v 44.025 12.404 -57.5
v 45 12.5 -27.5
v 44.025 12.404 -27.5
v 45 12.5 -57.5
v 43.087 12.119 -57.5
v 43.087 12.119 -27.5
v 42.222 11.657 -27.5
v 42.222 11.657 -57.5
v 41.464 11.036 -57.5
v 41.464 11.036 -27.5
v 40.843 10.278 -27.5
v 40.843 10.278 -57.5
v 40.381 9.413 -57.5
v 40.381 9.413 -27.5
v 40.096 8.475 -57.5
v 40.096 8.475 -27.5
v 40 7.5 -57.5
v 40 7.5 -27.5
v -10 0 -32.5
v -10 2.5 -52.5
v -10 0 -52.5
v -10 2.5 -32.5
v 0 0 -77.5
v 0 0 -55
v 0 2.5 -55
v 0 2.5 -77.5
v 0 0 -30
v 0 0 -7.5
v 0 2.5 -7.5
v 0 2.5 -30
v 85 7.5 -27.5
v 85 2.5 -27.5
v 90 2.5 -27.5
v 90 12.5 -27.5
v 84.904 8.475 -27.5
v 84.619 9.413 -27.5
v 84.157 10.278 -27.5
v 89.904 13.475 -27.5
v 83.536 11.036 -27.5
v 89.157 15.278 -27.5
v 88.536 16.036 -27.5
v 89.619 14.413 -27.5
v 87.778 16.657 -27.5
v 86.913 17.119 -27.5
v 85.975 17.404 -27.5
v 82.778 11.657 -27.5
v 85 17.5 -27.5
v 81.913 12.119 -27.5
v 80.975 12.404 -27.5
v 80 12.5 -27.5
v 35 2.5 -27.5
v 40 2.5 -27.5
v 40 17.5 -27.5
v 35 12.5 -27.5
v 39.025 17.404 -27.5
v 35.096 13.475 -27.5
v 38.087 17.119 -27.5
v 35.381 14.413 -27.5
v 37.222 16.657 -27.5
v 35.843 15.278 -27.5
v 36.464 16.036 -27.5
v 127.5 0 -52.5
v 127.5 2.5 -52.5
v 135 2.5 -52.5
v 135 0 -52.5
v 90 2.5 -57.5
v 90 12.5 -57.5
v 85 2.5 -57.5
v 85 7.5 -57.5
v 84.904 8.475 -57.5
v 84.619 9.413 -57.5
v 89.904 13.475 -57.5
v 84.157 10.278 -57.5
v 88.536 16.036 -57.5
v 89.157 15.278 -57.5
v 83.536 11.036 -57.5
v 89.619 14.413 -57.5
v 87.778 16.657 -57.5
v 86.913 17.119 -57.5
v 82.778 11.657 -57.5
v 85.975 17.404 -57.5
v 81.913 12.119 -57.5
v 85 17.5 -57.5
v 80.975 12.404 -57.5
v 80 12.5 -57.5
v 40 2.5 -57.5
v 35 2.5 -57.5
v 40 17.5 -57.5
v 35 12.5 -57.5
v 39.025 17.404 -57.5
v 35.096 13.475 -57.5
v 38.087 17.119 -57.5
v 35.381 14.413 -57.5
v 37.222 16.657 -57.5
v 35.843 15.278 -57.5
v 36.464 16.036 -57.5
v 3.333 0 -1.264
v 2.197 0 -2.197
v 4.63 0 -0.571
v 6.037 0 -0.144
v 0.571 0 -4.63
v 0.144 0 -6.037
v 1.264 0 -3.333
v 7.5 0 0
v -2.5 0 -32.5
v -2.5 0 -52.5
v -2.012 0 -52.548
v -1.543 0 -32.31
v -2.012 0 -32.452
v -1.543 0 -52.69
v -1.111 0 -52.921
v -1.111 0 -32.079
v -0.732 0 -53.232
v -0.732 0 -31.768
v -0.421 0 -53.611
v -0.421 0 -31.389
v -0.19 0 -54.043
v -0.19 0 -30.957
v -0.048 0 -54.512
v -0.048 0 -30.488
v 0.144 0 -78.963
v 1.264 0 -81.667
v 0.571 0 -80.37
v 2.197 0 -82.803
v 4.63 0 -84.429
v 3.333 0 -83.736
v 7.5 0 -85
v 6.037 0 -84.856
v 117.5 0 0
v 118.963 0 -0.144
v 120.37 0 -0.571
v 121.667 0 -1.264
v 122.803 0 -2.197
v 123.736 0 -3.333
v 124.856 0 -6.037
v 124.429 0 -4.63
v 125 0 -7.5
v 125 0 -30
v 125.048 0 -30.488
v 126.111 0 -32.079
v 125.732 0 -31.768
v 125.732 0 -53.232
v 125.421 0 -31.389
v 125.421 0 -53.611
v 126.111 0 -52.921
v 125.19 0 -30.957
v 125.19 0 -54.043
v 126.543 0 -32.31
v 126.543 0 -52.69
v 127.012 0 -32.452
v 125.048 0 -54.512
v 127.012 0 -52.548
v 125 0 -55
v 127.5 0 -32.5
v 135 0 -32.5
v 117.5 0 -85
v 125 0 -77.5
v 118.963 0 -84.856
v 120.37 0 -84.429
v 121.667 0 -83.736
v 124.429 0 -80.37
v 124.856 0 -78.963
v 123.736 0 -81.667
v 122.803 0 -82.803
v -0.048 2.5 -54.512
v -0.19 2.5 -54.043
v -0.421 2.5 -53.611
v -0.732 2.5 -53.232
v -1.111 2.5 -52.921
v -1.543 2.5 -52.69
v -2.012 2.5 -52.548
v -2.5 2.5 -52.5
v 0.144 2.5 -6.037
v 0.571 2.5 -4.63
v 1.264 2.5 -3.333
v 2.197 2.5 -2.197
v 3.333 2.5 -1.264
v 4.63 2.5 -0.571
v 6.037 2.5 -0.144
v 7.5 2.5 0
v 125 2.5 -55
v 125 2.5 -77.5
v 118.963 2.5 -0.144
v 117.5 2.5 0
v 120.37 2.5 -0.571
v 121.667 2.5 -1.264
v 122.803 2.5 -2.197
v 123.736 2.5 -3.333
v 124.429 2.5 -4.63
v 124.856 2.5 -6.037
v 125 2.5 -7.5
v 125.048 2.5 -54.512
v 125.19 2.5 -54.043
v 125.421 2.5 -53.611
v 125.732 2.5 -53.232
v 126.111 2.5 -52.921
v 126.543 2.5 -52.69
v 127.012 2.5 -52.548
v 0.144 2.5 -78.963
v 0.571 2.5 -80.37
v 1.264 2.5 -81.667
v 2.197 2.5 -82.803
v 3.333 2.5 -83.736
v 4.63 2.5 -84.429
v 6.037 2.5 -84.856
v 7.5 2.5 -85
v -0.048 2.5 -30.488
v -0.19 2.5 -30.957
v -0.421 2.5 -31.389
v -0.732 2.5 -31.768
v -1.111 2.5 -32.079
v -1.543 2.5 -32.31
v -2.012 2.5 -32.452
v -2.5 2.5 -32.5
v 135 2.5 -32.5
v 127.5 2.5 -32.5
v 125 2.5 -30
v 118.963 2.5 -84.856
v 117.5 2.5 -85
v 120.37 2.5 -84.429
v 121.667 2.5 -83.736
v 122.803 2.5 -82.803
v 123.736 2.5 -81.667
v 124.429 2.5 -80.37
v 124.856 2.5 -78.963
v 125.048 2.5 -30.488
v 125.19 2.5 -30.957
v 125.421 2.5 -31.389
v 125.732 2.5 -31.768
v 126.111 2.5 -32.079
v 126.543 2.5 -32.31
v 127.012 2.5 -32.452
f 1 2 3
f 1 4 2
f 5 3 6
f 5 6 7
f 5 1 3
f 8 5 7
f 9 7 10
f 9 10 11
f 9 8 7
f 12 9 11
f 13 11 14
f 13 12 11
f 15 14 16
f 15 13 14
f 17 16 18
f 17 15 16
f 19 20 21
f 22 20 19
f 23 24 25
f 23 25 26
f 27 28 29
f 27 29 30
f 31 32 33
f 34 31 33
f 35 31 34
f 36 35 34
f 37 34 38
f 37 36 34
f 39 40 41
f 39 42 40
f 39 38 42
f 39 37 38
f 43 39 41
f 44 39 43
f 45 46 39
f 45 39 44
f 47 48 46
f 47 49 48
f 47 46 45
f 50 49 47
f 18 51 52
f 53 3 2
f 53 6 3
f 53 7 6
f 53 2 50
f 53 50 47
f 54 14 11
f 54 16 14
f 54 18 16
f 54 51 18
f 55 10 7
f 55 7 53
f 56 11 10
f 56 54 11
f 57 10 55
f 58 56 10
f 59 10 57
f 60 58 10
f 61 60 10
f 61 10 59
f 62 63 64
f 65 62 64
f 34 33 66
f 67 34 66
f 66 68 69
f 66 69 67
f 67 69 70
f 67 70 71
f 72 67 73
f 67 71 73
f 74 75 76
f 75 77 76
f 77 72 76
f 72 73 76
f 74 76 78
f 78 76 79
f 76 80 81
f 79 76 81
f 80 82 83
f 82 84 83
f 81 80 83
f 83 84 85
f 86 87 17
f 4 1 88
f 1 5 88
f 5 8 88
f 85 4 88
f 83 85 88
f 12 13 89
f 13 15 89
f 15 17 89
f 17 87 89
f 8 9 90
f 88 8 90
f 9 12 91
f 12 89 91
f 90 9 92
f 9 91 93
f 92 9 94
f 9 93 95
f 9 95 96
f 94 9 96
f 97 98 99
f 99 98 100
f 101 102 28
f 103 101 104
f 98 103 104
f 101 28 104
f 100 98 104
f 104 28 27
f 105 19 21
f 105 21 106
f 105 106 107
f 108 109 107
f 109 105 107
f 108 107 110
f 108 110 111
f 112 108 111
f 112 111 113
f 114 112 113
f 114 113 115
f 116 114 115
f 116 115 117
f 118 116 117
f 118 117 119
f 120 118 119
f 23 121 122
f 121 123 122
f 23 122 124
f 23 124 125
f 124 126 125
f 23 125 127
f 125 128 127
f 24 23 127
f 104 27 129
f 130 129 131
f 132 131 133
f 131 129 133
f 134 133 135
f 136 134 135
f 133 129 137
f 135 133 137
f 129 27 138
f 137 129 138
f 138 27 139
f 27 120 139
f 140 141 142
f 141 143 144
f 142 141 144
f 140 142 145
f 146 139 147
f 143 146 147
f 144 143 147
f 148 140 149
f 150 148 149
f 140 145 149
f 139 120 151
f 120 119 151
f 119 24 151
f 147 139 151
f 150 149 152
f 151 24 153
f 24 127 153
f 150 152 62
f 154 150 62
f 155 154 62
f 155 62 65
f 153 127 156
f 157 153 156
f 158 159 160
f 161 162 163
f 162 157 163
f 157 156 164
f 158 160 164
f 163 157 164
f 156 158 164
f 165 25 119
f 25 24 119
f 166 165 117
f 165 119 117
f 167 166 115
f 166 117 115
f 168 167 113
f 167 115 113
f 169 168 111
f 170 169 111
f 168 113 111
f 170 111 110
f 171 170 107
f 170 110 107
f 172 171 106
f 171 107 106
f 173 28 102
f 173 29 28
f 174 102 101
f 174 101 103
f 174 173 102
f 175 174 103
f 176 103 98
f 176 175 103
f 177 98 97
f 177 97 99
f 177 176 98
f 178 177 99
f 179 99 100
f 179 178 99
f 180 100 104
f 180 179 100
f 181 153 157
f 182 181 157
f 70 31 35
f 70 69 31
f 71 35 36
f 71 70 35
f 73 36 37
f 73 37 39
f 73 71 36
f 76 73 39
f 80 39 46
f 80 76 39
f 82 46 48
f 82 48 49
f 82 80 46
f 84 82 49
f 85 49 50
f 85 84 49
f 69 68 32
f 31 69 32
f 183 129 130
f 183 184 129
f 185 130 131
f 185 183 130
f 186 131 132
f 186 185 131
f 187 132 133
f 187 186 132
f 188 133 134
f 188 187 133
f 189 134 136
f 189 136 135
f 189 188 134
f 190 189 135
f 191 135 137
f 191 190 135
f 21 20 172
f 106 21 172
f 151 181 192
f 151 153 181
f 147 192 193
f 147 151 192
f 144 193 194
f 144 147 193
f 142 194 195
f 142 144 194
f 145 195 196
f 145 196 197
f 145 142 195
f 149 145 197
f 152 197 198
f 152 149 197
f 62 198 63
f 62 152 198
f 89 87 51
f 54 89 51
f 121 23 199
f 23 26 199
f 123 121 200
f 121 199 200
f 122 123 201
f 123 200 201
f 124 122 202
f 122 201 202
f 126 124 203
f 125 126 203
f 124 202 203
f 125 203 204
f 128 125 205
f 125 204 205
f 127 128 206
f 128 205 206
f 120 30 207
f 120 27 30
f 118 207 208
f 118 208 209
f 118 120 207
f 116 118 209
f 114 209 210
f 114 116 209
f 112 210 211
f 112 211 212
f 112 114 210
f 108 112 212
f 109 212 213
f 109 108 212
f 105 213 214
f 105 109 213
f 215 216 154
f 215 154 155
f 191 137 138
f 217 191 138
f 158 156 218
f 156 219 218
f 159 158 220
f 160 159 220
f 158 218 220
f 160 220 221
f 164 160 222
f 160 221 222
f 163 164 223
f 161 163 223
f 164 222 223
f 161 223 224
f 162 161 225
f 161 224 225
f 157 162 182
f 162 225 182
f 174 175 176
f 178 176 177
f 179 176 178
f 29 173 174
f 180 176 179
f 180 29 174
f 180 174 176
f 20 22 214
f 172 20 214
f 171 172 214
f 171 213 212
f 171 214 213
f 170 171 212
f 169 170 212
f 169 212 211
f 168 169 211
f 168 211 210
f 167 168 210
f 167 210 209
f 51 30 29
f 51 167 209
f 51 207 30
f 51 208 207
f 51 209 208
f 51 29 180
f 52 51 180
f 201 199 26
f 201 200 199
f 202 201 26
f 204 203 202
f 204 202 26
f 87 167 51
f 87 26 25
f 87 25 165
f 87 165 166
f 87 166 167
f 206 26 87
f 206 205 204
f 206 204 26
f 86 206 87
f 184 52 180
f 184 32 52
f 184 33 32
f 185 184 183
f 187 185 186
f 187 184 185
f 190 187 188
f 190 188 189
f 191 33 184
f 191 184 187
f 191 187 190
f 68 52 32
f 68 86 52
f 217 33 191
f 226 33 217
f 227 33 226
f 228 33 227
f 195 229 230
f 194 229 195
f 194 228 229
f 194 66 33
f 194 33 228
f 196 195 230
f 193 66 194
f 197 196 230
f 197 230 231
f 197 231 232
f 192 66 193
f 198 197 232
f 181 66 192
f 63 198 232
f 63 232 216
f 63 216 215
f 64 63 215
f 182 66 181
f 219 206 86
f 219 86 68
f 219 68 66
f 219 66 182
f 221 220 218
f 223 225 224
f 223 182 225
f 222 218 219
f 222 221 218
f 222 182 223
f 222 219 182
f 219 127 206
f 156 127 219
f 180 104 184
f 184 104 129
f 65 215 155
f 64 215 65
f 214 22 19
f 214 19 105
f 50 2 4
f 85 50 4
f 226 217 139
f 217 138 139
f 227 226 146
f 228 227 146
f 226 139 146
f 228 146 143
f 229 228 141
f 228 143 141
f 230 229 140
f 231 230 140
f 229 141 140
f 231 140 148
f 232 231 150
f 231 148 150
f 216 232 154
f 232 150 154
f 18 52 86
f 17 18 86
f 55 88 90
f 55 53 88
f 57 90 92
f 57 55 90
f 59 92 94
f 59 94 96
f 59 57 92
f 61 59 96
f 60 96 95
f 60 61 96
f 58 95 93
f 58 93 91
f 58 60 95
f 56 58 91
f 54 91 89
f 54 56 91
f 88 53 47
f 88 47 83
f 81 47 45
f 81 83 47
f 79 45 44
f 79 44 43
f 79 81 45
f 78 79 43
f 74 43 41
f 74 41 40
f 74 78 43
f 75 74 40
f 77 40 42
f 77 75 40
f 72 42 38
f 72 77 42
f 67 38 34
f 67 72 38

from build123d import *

# Parameters (mm, degrees)
SKETCH1_W           = 125
SKETCH1_H           = 85
BOSS_EXTRUDE1_DEPTH = 2.5
SKETCH2_W           = 10
SKETCH2_H           = 20
SKETCH2_H_2         = 10
BOSS_EXTRUDE2_DEPTH = 2.5
FILLET1_R           = 2.5
FILLET2_R           = 7.5
SKETCH3_W           = 5
SKETCH3_H           = 15
BOSS_EXTRUDE3_DEPTH = 15
BOSS_EXTRUDE4_REACH = 130.671
SKETCH4_W           = 30
SKETCH4_H           = 5
FILLET3_R           = 5


with BuildPart() as part:
    # Sketch1 → Boss-Extrude1 (new body)
    with BuildSketch(Plane(origin=(0, 0, 0), x_dir=(1, 0, 0), z_dir=(0, 1, 0))):
        with Locations((62.5, 42.5)):
            Rectangle(SKETCH1_W, SKETCH1_H)
    extrude(amount=BOSS_EXTRUDE1_DEPTH)

    # Sketch2 → Boss-Extrude2 (add)
    with BuildSketch(Plane(origin=(0, 2.5, 0), x_dir=(1, 0, 0), z_dir=(0, 1, 0))):
        with Locations((130, 42.5)):
            Rectangle(SKETCH2_W, SKETCH2_H)
        with Locations((-5, 37.5)):
            Rectangle(SKETCH2_W, SKETCH2_H_2)
        with Locations((-5, 47.5)):
            Rectangle(SKETCH2_W, SKETCH2_H_2)
    extrude(amount=-BOSS_EXTRUDE2_DEPTH)

    # Fillet1
    fillet1_edges = [part.edges().sort_by_distance(p)[0] for p in [
        (125, 1.25, -32.5),
        (125, 1.25, -52.5),
        (0, 1.25, -32.5),
        (0, 1.25, -52.5),
    ]]
    fillet(fillet1_edges, radius=FILLET1_R)

    # Fillet2
    fillet2_edges = [part.edges().sort_by_distance(p)[0] for p in [
        (0, 1.25, -85),
        (125, 1.25, -85),
        (125, 1.25, 0),
        (0, 1.25, 0),
    ]]
    fillet(fillet2_edges, radius=FILLET2_R)

    # Sketch3 → Boss-Extrude3 (add)
    with BuildSketch(Plane(origin=(0, 2.5, 0), x_dir=(1, 0, 0), z_dir=(0, 1, 0))):
        with Locations((37.5, 50)):
            Rectangle(SKETCH3_W, SKETCH3_H)
        with Locations((37.5, 35)):
            Rectangle(SKETCH3_W, SKETCH3_H)
        with Locations((87.5, 50)):
            Rectangle(SKETCH3_W, SKETCH3_H)
        with Locations((87.5, 35)):
            Rectangle(SKETCH3_W, SKETCH3_H)
    extrude(amount=BOSS_EXTRUDE3_DEPTH)

    # Sketch4 → Boss-Extrude4 (add, up to next)
    with BuildSketch(Plane(origin=(40, 0, 0), x_dir=(0, 0, -1), z_dir=(1, 0, 0)), mode=Mode.PRIVATE) as boss_extrude4_sk1:
        with Locations((42.5, 15)):
            Rectangle(SKETCH4_W, SKETCH4_H)
    boss_extrude4_tool1 = extrude(boss_extrude4_sk1.sketch, amount=BOSS_EXTRUDE4_REACH, mode=Mode.PRIVATE) - part.part
    add(boss_extrude4_tool1.solids().sort_by_distance((40, 15, -42.5))[0])

    # Fillet3
    fillet3_edges = [part.edges().sort_by_distance(p)[0] for p in [
        (35, 17.5, -42.5),
        (90, 17.5, -42.5),
        (85, 12.5, -42.5),
        (40, 12.5, -42.5),
    ]]
    fillet(fillet3_edges, radius=FILLET3_R)


solid = part.part
